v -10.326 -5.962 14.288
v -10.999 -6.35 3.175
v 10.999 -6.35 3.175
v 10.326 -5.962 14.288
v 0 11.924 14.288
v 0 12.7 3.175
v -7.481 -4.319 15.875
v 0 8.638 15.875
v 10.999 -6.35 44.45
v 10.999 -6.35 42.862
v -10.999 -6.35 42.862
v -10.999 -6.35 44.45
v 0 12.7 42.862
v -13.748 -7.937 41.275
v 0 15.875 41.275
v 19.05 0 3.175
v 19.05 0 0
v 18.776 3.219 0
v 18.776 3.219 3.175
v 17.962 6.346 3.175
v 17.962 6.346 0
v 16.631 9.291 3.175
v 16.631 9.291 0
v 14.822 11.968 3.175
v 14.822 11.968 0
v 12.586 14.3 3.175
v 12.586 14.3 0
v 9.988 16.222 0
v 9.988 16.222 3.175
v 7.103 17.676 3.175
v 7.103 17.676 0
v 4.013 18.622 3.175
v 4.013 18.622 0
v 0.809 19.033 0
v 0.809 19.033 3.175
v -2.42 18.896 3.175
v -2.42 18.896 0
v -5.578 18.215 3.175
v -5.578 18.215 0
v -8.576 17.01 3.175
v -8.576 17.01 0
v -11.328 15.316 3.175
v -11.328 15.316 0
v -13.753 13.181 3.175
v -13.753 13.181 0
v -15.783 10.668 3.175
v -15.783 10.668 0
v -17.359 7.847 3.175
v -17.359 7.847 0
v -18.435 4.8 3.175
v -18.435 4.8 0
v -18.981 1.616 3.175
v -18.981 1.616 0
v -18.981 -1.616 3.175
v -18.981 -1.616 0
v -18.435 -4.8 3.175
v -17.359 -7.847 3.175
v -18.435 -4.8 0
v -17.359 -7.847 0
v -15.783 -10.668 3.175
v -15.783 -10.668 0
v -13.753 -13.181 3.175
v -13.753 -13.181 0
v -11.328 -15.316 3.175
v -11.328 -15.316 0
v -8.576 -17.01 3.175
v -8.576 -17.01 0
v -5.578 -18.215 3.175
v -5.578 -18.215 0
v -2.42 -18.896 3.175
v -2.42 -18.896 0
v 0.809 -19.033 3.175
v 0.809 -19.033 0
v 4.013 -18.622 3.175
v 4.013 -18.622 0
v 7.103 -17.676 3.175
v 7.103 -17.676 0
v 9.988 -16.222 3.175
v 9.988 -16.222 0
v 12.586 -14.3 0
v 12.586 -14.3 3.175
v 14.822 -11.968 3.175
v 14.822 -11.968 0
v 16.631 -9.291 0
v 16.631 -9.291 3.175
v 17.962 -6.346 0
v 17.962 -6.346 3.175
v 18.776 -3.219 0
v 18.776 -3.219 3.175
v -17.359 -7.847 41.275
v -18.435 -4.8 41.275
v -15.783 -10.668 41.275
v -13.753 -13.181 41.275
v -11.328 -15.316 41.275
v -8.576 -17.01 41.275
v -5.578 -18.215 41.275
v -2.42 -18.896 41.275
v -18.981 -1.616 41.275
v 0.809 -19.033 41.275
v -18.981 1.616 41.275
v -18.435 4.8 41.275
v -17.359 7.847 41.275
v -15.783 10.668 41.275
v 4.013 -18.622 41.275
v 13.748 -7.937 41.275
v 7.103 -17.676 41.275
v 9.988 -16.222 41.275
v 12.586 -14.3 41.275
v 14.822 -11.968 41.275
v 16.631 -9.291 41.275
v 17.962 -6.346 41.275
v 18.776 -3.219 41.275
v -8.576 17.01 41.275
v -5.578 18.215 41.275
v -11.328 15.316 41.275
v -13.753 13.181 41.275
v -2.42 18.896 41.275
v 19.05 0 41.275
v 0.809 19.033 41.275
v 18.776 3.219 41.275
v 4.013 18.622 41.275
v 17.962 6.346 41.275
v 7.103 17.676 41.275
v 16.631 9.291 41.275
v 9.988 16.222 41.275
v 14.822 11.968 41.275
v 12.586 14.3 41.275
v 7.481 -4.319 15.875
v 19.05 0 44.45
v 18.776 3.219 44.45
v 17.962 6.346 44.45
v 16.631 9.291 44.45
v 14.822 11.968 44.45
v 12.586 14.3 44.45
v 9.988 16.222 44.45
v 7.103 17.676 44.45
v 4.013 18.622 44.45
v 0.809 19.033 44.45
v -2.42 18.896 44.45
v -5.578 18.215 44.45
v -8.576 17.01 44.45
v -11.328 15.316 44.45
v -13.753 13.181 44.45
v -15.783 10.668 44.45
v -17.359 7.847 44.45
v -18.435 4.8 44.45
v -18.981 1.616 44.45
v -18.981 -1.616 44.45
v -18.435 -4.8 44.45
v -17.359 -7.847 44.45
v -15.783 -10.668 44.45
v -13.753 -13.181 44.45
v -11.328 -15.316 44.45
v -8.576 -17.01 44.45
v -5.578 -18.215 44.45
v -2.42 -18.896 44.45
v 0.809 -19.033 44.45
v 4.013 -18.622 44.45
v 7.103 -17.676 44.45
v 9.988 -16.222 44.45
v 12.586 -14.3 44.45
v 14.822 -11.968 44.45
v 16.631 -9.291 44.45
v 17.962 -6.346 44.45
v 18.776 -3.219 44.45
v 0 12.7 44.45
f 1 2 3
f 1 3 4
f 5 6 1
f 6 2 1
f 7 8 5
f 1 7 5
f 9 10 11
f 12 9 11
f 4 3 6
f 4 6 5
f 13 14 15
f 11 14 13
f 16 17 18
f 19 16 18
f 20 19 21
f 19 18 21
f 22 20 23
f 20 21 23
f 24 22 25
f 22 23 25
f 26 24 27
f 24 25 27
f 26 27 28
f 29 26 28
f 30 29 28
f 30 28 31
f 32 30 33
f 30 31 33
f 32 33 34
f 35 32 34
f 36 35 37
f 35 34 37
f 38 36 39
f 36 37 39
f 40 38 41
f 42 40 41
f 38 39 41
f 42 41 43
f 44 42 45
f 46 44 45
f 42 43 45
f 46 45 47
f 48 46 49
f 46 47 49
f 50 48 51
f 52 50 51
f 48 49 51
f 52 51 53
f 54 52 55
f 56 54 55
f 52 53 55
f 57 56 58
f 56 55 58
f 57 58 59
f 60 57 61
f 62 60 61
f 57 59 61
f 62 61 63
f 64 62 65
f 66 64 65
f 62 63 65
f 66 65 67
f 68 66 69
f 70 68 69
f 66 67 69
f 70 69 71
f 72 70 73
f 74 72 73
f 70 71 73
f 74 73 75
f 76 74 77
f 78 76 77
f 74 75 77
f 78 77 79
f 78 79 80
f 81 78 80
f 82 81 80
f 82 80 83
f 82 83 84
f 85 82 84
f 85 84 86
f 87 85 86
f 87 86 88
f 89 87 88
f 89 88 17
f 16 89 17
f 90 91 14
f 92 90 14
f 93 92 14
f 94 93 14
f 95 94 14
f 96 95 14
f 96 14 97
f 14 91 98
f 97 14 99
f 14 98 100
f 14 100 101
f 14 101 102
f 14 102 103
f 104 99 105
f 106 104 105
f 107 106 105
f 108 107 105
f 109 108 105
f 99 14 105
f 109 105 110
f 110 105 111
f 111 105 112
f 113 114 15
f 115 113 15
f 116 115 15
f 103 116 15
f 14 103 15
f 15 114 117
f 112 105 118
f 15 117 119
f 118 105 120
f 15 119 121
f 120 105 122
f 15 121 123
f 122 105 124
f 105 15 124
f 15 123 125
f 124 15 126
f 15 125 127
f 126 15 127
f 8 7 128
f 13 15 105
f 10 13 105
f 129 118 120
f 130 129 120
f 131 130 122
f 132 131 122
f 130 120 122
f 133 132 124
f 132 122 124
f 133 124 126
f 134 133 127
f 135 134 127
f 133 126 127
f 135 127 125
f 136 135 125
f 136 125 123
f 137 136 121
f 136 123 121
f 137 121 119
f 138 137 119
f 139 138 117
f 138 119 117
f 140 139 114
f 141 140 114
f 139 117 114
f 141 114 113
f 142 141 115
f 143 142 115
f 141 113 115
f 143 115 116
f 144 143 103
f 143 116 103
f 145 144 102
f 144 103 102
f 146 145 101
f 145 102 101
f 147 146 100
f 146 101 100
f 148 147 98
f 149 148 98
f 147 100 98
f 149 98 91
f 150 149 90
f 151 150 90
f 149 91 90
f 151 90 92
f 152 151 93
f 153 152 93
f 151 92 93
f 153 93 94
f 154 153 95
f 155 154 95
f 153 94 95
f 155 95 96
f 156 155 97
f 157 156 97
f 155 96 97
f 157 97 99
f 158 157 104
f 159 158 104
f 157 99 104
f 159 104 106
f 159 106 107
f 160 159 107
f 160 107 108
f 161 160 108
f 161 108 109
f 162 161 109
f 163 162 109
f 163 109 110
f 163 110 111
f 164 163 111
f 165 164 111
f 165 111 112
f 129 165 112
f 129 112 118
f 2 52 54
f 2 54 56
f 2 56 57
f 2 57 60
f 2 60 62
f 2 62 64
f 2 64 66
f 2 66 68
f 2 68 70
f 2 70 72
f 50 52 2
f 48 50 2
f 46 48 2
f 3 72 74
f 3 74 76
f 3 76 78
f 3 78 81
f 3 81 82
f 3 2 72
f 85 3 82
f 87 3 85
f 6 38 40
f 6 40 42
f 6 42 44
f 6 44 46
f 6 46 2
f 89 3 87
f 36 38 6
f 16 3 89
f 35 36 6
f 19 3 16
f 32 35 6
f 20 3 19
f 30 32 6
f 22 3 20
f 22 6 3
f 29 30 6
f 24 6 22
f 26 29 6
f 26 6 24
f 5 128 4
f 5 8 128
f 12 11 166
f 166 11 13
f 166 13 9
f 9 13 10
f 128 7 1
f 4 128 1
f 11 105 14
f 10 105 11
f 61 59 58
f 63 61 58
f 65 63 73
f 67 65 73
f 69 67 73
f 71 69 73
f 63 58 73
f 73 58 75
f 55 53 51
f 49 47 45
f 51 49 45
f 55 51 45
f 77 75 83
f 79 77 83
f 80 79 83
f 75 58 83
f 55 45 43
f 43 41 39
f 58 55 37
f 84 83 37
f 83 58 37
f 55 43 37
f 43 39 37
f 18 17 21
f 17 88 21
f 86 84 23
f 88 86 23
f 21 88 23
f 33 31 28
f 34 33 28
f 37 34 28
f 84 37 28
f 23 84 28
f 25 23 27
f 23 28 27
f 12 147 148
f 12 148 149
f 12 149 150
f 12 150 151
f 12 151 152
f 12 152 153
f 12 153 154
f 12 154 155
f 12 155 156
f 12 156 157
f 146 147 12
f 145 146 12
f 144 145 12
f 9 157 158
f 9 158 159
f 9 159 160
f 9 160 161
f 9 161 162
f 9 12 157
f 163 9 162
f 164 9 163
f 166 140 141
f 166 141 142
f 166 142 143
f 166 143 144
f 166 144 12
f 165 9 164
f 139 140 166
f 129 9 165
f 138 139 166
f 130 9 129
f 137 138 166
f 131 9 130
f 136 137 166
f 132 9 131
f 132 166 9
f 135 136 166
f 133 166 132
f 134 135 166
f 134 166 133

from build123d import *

# Parameters (mm, degrees)
F0_R      = 19.05
F1_DEPTH  = 3.175
F3_DEPTH  = 12.7
F3_TAPER  = 2
F5_R      = 19.05
F6_DEPTH  = 3.175
F7_SIZE   = 1.5875
F7_2_SIZE = 1.5875


with BuildPart() as f1:
    # F0 (on Top) → F1 (new body)
    with BuildSketch(Plane.XY):
        Circle(F0_R)
        Polygon((-10.9985226281, -6.35), (0, 12.7), (10.9985226281, -6.35), align=None, mode=Mode.SUBTRACT)
        Polygon((10.9985226281, -6.35), (0, 12.7), (-10.9985226281, -6.35), align=None)
    extrude(amount=F1_DEPTH)

    # F2 (on face) → F3 (join)
    with BuildSketch(Plane.XY.offset(3.175)):
        Polygon((10.9985226281, -6.35), (0, 12.7), (-10.9985226281, -6.35), align=None)
    extrude(amount=F3_DEPTH, taper=F3_TAPER)

    # F7
    f7_edges = [f1.edges().sort_by_distance(p)[0] for p in [
        (5.115184, 2.953253, 15.875),
        (0, -5.906506, 15.875),
        (-5.115184, 2.953253, 15.875),
    ]]
    chamfer(f7_edges, length=F7_SIZE)


with BuildPart() as f6:
    # F5 (on offset) → F6 (new body)
    with BuildSketch(Plane.XY.offset(41.275)):
        Circle(F5_R)
        Polygon((-10.9985226281, -6.35), (0, 12.7), (10.9985226281, -6.35), align=None, mode=Mode.SUBTRACT)
    extrude(amount=F6_DEPTH)

    # F7#2
    f7_2_edges = [f6.edges().sort_by_distance(p)[0] for p in [
        (-5.499261, 3.175, 41.275),
        (5.499261, 3.175, 41.275),
        (0, -6.35, 41.275),
    ]]
    chamfer(f7_2_edges, length=F7_2_SIZE)


solid = Compound([f1.part, f6.part])
